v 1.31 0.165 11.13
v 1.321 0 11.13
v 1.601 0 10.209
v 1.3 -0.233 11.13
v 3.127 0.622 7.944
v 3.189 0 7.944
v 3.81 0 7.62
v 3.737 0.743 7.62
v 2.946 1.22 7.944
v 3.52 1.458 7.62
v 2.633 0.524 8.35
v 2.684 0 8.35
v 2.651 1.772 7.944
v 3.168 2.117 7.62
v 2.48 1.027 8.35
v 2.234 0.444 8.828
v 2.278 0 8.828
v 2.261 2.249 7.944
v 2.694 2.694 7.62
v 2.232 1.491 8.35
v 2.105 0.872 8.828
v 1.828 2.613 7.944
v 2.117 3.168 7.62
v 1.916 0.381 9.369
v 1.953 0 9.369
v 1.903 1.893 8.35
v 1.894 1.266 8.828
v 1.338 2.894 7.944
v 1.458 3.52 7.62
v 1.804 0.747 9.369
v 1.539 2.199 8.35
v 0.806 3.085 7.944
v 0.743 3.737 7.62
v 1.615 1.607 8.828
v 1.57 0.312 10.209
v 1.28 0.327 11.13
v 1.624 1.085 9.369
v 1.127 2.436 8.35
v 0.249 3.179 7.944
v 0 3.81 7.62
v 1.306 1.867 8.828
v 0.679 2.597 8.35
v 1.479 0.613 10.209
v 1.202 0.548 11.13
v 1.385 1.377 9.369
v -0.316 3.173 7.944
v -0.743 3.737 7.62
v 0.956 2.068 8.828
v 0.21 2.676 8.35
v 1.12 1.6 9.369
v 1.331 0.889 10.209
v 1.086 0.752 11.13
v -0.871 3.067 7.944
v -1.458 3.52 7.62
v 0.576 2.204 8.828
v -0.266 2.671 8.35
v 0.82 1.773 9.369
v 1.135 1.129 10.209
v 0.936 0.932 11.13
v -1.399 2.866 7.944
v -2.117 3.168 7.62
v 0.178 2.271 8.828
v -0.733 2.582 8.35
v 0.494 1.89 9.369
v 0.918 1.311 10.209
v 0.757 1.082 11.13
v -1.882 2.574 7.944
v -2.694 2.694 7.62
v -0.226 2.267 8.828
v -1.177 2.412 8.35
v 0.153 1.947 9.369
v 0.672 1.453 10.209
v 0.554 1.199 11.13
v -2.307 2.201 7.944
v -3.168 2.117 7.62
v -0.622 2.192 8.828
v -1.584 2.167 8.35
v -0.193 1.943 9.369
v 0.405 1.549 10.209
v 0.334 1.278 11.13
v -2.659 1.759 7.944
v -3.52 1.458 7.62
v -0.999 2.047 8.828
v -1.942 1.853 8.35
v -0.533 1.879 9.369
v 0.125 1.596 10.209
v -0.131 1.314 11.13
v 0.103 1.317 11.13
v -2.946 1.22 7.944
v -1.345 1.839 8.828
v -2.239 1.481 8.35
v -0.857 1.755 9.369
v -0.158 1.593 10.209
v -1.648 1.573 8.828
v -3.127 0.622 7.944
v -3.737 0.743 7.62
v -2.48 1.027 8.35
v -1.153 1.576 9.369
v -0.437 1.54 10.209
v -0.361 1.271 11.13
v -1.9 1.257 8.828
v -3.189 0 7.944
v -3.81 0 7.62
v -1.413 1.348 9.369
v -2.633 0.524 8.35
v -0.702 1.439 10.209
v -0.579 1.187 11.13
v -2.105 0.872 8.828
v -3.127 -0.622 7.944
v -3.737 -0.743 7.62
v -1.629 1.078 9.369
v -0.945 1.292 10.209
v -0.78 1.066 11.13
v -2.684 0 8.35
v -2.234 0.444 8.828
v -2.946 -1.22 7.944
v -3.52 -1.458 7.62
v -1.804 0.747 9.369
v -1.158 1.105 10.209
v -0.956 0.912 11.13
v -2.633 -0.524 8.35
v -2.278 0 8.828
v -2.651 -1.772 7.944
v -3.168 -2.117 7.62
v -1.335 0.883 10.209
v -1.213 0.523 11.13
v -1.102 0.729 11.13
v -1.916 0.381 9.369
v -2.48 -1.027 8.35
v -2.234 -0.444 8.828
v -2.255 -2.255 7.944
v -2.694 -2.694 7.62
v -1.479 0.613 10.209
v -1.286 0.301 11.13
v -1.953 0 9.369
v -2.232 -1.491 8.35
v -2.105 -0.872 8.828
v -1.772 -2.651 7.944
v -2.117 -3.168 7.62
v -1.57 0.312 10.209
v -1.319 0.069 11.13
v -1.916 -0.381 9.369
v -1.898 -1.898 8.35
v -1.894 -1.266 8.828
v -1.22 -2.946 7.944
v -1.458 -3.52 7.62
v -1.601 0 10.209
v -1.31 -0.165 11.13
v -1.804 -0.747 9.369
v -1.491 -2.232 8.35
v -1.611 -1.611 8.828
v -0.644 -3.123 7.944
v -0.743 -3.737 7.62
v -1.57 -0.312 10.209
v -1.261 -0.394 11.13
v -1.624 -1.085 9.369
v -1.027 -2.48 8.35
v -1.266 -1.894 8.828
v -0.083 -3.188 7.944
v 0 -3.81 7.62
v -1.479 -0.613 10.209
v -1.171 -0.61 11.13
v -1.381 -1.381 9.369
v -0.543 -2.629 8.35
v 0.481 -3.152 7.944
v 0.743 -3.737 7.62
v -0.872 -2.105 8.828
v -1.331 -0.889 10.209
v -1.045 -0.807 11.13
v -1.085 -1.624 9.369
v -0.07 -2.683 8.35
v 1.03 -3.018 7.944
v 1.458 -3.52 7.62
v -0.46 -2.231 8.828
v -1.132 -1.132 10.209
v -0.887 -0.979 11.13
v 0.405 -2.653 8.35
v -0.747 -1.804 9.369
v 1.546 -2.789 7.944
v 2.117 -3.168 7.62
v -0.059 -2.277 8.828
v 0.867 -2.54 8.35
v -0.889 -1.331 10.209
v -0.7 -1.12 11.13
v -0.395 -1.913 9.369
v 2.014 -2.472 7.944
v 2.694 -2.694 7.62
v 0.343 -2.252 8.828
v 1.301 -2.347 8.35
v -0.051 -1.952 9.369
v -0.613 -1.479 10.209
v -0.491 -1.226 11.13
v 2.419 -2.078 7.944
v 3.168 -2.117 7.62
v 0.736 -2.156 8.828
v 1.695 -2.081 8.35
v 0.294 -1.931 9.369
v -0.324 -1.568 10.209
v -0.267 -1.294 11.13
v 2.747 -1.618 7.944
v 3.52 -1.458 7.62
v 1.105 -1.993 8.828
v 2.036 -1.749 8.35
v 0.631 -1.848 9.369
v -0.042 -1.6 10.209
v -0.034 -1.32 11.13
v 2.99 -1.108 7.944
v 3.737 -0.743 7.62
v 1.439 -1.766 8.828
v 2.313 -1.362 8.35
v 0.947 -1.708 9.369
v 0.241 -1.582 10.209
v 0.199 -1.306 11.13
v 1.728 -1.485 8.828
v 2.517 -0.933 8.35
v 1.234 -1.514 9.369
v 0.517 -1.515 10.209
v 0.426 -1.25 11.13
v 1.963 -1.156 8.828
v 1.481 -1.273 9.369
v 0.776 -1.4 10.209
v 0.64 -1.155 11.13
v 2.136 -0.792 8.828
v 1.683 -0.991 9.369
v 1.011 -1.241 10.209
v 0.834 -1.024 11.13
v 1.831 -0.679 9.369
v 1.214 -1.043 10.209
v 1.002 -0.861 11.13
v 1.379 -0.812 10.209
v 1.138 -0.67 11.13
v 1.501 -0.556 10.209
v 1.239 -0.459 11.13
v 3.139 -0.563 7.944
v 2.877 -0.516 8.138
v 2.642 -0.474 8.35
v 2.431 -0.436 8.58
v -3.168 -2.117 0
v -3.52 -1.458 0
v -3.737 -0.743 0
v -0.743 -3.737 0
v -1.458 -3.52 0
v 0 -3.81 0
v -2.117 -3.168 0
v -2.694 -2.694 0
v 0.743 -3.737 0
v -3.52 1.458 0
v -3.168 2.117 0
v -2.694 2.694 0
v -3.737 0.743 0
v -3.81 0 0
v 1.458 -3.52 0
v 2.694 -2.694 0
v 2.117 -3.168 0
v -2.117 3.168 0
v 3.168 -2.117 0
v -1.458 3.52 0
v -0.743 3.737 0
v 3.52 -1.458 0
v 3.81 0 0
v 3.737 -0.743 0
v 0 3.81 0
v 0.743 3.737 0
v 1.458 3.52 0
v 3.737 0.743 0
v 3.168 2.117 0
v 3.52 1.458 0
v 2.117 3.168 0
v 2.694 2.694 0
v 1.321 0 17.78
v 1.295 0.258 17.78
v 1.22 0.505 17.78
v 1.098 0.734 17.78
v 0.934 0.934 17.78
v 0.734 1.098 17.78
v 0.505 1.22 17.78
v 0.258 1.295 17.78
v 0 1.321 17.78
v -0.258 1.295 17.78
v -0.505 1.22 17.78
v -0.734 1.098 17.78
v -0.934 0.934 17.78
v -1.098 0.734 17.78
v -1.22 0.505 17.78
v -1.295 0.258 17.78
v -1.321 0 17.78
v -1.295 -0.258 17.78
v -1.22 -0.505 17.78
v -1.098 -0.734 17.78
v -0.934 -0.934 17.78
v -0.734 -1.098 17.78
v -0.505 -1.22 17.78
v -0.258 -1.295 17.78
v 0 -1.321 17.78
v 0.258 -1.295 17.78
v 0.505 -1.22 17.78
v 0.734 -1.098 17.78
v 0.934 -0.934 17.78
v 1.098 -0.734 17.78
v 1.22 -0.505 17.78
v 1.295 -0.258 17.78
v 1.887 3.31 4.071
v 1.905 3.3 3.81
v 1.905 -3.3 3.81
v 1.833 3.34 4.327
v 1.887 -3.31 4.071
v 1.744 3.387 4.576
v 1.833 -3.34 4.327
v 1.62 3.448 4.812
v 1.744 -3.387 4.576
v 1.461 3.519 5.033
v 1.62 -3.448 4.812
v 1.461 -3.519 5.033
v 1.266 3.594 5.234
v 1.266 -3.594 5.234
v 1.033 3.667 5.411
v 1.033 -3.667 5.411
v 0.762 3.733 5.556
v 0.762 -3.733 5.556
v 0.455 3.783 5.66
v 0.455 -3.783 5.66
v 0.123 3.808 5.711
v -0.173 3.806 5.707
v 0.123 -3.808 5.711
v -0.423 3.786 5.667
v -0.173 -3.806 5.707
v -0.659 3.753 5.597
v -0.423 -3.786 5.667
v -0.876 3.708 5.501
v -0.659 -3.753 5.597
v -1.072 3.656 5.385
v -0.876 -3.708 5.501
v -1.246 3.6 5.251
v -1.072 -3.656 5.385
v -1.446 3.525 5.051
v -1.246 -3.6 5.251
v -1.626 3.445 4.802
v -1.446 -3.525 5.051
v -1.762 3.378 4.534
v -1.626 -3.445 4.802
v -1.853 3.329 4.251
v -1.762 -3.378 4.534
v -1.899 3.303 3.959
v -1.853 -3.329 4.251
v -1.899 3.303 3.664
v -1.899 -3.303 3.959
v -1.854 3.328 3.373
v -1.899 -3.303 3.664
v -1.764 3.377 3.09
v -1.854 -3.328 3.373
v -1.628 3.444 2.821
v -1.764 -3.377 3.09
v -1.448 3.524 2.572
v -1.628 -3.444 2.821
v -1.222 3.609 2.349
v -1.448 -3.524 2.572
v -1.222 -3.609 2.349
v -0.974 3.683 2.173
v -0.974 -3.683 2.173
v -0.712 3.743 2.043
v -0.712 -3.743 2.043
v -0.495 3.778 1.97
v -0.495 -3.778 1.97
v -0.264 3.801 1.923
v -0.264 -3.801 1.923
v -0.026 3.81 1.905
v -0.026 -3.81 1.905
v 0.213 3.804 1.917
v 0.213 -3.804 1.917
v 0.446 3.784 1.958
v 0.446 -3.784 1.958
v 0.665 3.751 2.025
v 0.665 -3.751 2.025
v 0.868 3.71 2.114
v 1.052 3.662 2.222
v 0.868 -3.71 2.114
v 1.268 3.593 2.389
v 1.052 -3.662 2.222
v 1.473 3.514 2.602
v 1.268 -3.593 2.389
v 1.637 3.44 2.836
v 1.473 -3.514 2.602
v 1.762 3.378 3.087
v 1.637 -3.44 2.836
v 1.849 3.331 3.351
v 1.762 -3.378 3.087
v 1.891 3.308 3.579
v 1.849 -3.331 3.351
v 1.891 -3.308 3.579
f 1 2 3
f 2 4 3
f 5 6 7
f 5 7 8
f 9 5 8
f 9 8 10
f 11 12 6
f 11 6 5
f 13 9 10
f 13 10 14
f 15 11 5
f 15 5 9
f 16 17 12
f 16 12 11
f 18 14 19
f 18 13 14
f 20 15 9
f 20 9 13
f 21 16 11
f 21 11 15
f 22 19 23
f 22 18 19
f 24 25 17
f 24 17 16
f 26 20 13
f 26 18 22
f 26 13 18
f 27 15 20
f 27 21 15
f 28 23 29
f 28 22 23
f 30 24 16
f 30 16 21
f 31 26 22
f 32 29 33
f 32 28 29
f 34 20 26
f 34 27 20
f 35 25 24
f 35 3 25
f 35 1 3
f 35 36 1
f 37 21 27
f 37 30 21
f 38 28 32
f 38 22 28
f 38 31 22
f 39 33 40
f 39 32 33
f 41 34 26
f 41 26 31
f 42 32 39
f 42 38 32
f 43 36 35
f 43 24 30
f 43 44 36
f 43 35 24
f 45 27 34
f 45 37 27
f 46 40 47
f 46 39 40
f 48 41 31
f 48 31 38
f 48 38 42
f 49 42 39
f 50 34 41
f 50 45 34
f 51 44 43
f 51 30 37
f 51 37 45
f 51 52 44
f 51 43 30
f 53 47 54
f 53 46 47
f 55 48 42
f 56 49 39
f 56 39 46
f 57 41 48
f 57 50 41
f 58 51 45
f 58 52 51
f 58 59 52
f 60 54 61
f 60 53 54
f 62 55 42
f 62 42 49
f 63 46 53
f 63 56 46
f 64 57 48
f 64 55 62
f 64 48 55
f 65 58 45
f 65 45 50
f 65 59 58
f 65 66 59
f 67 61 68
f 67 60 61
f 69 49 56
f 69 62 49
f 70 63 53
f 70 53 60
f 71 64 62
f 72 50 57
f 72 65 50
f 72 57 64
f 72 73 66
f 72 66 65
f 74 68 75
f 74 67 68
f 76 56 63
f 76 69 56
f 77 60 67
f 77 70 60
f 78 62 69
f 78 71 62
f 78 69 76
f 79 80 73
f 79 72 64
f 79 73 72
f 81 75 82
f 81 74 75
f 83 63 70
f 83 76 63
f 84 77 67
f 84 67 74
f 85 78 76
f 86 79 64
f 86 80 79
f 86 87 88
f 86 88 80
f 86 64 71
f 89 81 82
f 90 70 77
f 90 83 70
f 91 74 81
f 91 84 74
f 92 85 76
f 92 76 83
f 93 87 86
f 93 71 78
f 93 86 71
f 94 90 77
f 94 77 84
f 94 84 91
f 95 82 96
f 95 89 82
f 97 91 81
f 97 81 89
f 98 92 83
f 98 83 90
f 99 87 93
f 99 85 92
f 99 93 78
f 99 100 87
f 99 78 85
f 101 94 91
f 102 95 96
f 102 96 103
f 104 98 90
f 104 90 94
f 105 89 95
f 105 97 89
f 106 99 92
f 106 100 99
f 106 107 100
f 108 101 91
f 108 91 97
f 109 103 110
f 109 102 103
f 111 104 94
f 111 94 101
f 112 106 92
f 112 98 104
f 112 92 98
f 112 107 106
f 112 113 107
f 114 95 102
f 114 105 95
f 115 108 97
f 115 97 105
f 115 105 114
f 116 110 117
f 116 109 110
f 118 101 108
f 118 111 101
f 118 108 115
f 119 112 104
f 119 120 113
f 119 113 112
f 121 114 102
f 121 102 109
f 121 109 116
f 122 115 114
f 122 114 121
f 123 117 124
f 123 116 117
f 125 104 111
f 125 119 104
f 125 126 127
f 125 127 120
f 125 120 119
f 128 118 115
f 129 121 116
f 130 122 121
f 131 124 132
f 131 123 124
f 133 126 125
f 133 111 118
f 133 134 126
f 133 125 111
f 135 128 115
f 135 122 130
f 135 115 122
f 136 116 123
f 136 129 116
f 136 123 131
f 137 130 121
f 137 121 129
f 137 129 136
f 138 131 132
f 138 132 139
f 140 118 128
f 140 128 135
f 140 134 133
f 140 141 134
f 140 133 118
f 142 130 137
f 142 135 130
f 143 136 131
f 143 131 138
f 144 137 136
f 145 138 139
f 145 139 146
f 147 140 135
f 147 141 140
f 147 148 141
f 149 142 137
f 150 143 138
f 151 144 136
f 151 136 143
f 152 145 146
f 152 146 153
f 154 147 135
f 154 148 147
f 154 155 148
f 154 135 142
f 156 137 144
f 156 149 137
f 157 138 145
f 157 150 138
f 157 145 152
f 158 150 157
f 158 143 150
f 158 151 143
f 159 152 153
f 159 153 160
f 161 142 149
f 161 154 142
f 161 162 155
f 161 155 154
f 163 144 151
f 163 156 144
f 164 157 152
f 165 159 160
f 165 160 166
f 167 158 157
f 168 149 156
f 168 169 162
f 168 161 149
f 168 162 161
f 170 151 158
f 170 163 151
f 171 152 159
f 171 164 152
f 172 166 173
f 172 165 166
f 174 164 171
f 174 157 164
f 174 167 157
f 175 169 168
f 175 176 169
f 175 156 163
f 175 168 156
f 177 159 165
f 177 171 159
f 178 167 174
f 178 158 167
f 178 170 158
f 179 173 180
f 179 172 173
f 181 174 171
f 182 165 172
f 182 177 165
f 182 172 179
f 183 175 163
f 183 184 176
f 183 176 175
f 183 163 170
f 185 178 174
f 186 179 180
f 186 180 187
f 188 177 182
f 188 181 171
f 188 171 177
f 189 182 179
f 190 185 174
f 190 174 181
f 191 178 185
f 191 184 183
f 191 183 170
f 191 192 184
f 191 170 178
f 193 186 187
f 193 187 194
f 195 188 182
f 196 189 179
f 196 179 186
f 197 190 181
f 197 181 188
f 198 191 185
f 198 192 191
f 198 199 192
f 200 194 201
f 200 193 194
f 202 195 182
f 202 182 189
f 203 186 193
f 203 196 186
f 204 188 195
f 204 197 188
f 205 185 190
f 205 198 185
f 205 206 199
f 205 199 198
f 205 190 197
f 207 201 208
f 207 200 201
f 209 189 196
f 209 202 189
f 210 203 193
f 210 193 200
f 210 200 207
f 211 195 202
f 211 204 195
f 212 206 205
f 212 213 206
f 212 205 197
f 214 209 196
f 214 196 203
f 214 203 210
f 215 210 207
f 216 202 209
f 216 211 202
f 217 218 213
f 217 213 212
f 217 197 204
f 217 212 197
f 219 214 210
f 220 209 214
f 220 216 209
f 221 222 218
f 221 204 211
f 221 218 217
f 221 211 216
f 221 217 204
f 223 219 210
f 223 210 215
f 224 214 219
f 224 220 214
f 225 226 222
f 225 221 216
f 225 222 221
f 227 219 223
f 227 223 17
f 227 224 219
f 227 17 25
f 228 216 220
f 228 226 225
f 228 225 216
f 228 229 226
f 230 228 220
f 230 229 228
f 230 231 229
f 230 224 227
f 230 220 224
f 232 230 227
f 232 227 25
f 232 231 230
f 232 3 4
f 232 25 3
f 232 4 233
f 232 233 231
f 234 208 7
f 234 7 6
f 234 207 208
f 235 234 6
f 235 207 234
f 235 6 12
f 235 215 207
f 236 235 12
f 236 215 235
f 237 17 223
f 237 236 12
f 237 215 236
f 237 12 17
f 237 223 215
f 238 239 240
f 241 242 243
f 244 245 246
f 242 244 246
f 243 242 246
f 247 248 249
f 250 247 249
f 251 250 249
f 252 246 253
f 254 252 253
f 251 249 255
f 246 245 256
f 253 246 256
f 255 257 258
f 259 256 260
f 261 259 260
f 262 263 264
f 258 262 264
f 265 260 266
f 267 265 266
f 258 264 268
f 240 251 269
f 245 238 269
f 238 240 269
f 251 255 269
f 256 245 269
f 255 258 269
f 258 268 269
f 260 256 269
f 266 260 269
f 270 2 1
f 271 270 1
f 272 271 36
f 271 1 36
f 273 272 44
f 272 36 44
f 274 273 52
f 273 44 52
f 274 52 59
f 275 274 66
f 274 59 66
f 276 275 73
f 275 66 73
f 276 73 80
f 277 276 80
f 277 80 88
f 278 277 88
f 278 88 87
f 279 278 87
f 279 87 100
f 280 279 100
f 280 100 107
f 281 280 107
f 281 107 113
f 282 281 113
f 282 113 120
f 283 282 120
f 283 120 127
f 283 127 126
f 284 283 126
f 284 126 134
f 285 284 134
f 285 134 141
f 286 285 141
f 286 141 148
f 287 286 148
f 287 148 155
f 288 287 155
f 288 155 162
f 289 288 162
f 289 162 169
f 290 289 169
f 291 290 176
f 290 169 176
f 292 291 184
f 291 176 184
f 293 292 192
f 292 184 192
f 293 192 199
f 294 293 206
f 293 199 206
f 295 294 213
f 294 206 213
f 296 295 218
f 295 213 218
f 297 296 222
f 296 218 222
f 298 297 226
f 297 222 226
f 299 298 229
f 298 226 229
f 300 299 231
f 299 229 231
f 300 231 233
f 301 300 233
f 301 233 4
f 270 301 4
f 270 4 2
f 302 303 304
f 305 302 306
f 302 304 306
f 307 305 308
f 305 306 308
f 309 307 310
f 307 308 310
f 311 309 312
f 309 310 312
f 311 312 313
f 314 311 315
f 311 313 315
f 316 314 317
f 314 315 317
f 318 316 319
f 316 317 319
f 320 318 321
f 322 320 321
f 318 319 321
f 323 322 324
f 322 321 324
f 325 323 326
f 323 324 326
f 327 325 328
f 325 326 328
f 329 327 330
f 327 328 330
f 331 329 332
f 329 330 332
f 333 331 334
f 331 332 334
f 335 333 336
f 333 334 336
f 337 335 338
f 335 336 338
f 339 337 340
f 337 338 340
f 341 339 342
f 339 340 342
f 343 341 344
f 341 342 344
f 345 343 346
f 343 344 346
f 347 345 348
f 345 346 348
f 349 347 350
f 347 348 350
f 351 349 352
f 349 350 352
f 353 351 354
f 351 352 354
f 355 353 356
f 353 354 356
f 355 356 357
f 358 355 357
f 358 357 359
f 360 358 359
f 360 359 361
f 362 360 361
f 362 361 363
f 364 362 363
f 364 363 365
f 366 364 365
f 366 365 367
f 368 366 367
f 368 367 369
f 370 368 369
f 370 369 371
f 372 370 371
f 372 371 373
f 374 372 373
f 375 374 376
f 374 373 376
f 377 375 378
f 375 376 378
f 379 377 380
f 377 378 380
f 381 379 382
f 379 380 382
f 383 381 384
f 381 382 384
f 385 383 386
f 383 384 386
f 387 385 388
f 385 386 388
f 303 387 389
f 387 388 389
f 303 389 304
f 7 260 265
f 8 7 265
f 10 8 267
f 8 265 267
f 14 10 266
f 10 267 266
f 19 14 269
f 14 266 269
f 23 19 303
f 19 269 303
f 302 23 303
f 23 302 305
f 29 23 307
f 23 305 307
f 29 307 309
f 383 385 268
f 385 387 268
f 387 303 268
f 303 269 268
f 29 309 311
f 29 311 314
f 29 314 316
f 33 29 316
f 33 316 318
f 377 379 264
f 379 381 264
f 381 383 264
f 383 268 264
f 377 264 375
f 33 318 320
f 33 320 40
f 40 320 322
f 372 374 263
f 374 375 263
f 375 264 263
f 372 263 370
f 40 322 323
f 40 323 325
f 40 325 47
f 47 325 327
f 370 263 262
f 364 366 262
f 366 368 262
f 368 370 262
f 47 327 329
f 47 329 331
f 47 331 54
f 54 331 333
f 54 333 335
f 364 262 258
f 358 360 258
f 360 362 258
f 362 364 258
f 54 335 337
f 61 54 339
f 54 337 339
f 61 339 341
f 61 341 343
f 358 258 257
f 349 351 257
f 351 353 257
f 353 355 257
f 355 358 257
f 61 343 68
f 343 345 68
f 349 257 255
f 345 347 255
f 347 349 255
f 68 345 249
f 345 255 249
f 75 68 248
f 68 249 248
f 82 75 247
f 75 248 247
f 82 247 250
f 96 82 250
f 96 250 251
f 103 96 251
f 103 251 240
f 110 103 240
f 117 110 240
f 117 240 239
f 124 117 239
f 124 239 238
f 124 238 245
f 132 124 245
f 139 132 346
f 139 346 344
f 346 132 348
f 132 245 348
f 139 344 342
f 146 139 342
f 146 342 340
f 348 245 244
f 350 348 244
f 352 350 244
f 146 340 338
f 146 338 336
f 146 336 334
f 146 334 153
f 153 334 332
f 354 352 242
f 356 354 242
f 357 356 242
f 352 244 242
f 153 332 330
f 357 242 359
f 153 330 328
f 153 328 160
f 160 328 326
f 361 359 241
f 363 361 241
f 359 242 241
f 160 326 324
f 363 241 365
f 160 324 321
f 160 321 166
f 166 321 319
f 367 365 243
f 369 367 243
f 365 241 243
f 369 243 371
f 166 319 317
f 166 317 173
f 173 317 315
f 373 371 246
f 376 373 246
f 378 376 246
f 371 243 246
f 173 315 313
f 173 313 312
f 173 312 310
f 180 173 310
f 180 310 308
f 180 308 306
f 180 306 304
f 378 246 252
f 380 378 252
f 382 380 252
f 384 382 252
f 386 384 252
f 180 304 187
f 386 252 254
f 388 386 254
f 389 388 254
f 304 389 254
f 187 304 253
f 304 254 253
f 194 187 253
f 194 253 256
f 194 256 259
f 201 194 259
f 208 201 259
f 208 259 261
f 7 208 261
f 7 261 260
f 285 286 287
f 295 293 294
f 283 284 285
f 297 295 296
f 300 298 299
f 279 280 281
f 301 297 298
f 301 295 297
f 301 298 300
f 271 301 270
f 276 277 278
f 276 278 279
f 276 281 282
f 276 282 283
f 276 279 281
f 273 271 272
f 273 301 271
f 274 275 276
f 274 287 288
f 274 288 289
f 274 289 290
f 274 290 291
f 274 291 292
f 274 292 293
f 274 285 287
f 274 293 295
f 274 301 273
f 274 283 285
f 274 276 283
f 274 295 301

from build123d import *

# Parameters (mm, degrees)
F0_R          = 3.81
F0_R_2        = 1.3208
F1_DEPTH      = 7.62
F2_DEPTH      = 17.78
F3_R          = 1.905
F4_DEPTH      = 25.4
F4_DEPTH_BACK = 25.4


with BuildPart() as f1:
    # F0 (on Top) → F1 (new body)
    with BuildSketch(Plane.XY):
        Circle(F0_R)
        Circle(F0_R_2, mode=Mode.SUBTRACT)
        Circle(F0_R_2)
    extrude(amount=F1_DEPTH)

    # F0 (on Top) → F2 (join)
    with BuildSketch(Plane.XY):
        Circle(F0_R_2)
    extrude(amount=F2_DEPTH)

    # F3 (on Front) → F4 (cut, two sides)
    with BuildSketch(Plane.XZ) as f4_sk:
        with Locations((0, 3.81)):
            Circle(F3_R)
    extrude(amount=-F4_DEPTH, mode=Mode.SUBTRACT)
    extrude(f4_sk.sketch, amount=F4_DEPTH_BACK, mode=Mode.SUBTRACT)

    # F5 (on Front) → F6 (revolve)
    with BuildSketch(Plane.XZ):
        with BuildLine():
            Line((0, 15.0378467515), (0, 7.62))
            Line((0, 7.62), (3.81, 7.62))
            add(Edge.make_bspline(
                [(3.81, 7.62), (1.0146183195, 8.7640155107), (1.5803196002, 12.1609568596), (0, 15.0378467515)],
                knots=[0, 0, 0, 0, 8.3390976987, 8.3390976987, 8.3390976987, 8.3390976987], degree=3))
        make_face()
    revolve(axis=Axis((0, 0, 17.78), (0, 0, 1)))


solid = f1.part
